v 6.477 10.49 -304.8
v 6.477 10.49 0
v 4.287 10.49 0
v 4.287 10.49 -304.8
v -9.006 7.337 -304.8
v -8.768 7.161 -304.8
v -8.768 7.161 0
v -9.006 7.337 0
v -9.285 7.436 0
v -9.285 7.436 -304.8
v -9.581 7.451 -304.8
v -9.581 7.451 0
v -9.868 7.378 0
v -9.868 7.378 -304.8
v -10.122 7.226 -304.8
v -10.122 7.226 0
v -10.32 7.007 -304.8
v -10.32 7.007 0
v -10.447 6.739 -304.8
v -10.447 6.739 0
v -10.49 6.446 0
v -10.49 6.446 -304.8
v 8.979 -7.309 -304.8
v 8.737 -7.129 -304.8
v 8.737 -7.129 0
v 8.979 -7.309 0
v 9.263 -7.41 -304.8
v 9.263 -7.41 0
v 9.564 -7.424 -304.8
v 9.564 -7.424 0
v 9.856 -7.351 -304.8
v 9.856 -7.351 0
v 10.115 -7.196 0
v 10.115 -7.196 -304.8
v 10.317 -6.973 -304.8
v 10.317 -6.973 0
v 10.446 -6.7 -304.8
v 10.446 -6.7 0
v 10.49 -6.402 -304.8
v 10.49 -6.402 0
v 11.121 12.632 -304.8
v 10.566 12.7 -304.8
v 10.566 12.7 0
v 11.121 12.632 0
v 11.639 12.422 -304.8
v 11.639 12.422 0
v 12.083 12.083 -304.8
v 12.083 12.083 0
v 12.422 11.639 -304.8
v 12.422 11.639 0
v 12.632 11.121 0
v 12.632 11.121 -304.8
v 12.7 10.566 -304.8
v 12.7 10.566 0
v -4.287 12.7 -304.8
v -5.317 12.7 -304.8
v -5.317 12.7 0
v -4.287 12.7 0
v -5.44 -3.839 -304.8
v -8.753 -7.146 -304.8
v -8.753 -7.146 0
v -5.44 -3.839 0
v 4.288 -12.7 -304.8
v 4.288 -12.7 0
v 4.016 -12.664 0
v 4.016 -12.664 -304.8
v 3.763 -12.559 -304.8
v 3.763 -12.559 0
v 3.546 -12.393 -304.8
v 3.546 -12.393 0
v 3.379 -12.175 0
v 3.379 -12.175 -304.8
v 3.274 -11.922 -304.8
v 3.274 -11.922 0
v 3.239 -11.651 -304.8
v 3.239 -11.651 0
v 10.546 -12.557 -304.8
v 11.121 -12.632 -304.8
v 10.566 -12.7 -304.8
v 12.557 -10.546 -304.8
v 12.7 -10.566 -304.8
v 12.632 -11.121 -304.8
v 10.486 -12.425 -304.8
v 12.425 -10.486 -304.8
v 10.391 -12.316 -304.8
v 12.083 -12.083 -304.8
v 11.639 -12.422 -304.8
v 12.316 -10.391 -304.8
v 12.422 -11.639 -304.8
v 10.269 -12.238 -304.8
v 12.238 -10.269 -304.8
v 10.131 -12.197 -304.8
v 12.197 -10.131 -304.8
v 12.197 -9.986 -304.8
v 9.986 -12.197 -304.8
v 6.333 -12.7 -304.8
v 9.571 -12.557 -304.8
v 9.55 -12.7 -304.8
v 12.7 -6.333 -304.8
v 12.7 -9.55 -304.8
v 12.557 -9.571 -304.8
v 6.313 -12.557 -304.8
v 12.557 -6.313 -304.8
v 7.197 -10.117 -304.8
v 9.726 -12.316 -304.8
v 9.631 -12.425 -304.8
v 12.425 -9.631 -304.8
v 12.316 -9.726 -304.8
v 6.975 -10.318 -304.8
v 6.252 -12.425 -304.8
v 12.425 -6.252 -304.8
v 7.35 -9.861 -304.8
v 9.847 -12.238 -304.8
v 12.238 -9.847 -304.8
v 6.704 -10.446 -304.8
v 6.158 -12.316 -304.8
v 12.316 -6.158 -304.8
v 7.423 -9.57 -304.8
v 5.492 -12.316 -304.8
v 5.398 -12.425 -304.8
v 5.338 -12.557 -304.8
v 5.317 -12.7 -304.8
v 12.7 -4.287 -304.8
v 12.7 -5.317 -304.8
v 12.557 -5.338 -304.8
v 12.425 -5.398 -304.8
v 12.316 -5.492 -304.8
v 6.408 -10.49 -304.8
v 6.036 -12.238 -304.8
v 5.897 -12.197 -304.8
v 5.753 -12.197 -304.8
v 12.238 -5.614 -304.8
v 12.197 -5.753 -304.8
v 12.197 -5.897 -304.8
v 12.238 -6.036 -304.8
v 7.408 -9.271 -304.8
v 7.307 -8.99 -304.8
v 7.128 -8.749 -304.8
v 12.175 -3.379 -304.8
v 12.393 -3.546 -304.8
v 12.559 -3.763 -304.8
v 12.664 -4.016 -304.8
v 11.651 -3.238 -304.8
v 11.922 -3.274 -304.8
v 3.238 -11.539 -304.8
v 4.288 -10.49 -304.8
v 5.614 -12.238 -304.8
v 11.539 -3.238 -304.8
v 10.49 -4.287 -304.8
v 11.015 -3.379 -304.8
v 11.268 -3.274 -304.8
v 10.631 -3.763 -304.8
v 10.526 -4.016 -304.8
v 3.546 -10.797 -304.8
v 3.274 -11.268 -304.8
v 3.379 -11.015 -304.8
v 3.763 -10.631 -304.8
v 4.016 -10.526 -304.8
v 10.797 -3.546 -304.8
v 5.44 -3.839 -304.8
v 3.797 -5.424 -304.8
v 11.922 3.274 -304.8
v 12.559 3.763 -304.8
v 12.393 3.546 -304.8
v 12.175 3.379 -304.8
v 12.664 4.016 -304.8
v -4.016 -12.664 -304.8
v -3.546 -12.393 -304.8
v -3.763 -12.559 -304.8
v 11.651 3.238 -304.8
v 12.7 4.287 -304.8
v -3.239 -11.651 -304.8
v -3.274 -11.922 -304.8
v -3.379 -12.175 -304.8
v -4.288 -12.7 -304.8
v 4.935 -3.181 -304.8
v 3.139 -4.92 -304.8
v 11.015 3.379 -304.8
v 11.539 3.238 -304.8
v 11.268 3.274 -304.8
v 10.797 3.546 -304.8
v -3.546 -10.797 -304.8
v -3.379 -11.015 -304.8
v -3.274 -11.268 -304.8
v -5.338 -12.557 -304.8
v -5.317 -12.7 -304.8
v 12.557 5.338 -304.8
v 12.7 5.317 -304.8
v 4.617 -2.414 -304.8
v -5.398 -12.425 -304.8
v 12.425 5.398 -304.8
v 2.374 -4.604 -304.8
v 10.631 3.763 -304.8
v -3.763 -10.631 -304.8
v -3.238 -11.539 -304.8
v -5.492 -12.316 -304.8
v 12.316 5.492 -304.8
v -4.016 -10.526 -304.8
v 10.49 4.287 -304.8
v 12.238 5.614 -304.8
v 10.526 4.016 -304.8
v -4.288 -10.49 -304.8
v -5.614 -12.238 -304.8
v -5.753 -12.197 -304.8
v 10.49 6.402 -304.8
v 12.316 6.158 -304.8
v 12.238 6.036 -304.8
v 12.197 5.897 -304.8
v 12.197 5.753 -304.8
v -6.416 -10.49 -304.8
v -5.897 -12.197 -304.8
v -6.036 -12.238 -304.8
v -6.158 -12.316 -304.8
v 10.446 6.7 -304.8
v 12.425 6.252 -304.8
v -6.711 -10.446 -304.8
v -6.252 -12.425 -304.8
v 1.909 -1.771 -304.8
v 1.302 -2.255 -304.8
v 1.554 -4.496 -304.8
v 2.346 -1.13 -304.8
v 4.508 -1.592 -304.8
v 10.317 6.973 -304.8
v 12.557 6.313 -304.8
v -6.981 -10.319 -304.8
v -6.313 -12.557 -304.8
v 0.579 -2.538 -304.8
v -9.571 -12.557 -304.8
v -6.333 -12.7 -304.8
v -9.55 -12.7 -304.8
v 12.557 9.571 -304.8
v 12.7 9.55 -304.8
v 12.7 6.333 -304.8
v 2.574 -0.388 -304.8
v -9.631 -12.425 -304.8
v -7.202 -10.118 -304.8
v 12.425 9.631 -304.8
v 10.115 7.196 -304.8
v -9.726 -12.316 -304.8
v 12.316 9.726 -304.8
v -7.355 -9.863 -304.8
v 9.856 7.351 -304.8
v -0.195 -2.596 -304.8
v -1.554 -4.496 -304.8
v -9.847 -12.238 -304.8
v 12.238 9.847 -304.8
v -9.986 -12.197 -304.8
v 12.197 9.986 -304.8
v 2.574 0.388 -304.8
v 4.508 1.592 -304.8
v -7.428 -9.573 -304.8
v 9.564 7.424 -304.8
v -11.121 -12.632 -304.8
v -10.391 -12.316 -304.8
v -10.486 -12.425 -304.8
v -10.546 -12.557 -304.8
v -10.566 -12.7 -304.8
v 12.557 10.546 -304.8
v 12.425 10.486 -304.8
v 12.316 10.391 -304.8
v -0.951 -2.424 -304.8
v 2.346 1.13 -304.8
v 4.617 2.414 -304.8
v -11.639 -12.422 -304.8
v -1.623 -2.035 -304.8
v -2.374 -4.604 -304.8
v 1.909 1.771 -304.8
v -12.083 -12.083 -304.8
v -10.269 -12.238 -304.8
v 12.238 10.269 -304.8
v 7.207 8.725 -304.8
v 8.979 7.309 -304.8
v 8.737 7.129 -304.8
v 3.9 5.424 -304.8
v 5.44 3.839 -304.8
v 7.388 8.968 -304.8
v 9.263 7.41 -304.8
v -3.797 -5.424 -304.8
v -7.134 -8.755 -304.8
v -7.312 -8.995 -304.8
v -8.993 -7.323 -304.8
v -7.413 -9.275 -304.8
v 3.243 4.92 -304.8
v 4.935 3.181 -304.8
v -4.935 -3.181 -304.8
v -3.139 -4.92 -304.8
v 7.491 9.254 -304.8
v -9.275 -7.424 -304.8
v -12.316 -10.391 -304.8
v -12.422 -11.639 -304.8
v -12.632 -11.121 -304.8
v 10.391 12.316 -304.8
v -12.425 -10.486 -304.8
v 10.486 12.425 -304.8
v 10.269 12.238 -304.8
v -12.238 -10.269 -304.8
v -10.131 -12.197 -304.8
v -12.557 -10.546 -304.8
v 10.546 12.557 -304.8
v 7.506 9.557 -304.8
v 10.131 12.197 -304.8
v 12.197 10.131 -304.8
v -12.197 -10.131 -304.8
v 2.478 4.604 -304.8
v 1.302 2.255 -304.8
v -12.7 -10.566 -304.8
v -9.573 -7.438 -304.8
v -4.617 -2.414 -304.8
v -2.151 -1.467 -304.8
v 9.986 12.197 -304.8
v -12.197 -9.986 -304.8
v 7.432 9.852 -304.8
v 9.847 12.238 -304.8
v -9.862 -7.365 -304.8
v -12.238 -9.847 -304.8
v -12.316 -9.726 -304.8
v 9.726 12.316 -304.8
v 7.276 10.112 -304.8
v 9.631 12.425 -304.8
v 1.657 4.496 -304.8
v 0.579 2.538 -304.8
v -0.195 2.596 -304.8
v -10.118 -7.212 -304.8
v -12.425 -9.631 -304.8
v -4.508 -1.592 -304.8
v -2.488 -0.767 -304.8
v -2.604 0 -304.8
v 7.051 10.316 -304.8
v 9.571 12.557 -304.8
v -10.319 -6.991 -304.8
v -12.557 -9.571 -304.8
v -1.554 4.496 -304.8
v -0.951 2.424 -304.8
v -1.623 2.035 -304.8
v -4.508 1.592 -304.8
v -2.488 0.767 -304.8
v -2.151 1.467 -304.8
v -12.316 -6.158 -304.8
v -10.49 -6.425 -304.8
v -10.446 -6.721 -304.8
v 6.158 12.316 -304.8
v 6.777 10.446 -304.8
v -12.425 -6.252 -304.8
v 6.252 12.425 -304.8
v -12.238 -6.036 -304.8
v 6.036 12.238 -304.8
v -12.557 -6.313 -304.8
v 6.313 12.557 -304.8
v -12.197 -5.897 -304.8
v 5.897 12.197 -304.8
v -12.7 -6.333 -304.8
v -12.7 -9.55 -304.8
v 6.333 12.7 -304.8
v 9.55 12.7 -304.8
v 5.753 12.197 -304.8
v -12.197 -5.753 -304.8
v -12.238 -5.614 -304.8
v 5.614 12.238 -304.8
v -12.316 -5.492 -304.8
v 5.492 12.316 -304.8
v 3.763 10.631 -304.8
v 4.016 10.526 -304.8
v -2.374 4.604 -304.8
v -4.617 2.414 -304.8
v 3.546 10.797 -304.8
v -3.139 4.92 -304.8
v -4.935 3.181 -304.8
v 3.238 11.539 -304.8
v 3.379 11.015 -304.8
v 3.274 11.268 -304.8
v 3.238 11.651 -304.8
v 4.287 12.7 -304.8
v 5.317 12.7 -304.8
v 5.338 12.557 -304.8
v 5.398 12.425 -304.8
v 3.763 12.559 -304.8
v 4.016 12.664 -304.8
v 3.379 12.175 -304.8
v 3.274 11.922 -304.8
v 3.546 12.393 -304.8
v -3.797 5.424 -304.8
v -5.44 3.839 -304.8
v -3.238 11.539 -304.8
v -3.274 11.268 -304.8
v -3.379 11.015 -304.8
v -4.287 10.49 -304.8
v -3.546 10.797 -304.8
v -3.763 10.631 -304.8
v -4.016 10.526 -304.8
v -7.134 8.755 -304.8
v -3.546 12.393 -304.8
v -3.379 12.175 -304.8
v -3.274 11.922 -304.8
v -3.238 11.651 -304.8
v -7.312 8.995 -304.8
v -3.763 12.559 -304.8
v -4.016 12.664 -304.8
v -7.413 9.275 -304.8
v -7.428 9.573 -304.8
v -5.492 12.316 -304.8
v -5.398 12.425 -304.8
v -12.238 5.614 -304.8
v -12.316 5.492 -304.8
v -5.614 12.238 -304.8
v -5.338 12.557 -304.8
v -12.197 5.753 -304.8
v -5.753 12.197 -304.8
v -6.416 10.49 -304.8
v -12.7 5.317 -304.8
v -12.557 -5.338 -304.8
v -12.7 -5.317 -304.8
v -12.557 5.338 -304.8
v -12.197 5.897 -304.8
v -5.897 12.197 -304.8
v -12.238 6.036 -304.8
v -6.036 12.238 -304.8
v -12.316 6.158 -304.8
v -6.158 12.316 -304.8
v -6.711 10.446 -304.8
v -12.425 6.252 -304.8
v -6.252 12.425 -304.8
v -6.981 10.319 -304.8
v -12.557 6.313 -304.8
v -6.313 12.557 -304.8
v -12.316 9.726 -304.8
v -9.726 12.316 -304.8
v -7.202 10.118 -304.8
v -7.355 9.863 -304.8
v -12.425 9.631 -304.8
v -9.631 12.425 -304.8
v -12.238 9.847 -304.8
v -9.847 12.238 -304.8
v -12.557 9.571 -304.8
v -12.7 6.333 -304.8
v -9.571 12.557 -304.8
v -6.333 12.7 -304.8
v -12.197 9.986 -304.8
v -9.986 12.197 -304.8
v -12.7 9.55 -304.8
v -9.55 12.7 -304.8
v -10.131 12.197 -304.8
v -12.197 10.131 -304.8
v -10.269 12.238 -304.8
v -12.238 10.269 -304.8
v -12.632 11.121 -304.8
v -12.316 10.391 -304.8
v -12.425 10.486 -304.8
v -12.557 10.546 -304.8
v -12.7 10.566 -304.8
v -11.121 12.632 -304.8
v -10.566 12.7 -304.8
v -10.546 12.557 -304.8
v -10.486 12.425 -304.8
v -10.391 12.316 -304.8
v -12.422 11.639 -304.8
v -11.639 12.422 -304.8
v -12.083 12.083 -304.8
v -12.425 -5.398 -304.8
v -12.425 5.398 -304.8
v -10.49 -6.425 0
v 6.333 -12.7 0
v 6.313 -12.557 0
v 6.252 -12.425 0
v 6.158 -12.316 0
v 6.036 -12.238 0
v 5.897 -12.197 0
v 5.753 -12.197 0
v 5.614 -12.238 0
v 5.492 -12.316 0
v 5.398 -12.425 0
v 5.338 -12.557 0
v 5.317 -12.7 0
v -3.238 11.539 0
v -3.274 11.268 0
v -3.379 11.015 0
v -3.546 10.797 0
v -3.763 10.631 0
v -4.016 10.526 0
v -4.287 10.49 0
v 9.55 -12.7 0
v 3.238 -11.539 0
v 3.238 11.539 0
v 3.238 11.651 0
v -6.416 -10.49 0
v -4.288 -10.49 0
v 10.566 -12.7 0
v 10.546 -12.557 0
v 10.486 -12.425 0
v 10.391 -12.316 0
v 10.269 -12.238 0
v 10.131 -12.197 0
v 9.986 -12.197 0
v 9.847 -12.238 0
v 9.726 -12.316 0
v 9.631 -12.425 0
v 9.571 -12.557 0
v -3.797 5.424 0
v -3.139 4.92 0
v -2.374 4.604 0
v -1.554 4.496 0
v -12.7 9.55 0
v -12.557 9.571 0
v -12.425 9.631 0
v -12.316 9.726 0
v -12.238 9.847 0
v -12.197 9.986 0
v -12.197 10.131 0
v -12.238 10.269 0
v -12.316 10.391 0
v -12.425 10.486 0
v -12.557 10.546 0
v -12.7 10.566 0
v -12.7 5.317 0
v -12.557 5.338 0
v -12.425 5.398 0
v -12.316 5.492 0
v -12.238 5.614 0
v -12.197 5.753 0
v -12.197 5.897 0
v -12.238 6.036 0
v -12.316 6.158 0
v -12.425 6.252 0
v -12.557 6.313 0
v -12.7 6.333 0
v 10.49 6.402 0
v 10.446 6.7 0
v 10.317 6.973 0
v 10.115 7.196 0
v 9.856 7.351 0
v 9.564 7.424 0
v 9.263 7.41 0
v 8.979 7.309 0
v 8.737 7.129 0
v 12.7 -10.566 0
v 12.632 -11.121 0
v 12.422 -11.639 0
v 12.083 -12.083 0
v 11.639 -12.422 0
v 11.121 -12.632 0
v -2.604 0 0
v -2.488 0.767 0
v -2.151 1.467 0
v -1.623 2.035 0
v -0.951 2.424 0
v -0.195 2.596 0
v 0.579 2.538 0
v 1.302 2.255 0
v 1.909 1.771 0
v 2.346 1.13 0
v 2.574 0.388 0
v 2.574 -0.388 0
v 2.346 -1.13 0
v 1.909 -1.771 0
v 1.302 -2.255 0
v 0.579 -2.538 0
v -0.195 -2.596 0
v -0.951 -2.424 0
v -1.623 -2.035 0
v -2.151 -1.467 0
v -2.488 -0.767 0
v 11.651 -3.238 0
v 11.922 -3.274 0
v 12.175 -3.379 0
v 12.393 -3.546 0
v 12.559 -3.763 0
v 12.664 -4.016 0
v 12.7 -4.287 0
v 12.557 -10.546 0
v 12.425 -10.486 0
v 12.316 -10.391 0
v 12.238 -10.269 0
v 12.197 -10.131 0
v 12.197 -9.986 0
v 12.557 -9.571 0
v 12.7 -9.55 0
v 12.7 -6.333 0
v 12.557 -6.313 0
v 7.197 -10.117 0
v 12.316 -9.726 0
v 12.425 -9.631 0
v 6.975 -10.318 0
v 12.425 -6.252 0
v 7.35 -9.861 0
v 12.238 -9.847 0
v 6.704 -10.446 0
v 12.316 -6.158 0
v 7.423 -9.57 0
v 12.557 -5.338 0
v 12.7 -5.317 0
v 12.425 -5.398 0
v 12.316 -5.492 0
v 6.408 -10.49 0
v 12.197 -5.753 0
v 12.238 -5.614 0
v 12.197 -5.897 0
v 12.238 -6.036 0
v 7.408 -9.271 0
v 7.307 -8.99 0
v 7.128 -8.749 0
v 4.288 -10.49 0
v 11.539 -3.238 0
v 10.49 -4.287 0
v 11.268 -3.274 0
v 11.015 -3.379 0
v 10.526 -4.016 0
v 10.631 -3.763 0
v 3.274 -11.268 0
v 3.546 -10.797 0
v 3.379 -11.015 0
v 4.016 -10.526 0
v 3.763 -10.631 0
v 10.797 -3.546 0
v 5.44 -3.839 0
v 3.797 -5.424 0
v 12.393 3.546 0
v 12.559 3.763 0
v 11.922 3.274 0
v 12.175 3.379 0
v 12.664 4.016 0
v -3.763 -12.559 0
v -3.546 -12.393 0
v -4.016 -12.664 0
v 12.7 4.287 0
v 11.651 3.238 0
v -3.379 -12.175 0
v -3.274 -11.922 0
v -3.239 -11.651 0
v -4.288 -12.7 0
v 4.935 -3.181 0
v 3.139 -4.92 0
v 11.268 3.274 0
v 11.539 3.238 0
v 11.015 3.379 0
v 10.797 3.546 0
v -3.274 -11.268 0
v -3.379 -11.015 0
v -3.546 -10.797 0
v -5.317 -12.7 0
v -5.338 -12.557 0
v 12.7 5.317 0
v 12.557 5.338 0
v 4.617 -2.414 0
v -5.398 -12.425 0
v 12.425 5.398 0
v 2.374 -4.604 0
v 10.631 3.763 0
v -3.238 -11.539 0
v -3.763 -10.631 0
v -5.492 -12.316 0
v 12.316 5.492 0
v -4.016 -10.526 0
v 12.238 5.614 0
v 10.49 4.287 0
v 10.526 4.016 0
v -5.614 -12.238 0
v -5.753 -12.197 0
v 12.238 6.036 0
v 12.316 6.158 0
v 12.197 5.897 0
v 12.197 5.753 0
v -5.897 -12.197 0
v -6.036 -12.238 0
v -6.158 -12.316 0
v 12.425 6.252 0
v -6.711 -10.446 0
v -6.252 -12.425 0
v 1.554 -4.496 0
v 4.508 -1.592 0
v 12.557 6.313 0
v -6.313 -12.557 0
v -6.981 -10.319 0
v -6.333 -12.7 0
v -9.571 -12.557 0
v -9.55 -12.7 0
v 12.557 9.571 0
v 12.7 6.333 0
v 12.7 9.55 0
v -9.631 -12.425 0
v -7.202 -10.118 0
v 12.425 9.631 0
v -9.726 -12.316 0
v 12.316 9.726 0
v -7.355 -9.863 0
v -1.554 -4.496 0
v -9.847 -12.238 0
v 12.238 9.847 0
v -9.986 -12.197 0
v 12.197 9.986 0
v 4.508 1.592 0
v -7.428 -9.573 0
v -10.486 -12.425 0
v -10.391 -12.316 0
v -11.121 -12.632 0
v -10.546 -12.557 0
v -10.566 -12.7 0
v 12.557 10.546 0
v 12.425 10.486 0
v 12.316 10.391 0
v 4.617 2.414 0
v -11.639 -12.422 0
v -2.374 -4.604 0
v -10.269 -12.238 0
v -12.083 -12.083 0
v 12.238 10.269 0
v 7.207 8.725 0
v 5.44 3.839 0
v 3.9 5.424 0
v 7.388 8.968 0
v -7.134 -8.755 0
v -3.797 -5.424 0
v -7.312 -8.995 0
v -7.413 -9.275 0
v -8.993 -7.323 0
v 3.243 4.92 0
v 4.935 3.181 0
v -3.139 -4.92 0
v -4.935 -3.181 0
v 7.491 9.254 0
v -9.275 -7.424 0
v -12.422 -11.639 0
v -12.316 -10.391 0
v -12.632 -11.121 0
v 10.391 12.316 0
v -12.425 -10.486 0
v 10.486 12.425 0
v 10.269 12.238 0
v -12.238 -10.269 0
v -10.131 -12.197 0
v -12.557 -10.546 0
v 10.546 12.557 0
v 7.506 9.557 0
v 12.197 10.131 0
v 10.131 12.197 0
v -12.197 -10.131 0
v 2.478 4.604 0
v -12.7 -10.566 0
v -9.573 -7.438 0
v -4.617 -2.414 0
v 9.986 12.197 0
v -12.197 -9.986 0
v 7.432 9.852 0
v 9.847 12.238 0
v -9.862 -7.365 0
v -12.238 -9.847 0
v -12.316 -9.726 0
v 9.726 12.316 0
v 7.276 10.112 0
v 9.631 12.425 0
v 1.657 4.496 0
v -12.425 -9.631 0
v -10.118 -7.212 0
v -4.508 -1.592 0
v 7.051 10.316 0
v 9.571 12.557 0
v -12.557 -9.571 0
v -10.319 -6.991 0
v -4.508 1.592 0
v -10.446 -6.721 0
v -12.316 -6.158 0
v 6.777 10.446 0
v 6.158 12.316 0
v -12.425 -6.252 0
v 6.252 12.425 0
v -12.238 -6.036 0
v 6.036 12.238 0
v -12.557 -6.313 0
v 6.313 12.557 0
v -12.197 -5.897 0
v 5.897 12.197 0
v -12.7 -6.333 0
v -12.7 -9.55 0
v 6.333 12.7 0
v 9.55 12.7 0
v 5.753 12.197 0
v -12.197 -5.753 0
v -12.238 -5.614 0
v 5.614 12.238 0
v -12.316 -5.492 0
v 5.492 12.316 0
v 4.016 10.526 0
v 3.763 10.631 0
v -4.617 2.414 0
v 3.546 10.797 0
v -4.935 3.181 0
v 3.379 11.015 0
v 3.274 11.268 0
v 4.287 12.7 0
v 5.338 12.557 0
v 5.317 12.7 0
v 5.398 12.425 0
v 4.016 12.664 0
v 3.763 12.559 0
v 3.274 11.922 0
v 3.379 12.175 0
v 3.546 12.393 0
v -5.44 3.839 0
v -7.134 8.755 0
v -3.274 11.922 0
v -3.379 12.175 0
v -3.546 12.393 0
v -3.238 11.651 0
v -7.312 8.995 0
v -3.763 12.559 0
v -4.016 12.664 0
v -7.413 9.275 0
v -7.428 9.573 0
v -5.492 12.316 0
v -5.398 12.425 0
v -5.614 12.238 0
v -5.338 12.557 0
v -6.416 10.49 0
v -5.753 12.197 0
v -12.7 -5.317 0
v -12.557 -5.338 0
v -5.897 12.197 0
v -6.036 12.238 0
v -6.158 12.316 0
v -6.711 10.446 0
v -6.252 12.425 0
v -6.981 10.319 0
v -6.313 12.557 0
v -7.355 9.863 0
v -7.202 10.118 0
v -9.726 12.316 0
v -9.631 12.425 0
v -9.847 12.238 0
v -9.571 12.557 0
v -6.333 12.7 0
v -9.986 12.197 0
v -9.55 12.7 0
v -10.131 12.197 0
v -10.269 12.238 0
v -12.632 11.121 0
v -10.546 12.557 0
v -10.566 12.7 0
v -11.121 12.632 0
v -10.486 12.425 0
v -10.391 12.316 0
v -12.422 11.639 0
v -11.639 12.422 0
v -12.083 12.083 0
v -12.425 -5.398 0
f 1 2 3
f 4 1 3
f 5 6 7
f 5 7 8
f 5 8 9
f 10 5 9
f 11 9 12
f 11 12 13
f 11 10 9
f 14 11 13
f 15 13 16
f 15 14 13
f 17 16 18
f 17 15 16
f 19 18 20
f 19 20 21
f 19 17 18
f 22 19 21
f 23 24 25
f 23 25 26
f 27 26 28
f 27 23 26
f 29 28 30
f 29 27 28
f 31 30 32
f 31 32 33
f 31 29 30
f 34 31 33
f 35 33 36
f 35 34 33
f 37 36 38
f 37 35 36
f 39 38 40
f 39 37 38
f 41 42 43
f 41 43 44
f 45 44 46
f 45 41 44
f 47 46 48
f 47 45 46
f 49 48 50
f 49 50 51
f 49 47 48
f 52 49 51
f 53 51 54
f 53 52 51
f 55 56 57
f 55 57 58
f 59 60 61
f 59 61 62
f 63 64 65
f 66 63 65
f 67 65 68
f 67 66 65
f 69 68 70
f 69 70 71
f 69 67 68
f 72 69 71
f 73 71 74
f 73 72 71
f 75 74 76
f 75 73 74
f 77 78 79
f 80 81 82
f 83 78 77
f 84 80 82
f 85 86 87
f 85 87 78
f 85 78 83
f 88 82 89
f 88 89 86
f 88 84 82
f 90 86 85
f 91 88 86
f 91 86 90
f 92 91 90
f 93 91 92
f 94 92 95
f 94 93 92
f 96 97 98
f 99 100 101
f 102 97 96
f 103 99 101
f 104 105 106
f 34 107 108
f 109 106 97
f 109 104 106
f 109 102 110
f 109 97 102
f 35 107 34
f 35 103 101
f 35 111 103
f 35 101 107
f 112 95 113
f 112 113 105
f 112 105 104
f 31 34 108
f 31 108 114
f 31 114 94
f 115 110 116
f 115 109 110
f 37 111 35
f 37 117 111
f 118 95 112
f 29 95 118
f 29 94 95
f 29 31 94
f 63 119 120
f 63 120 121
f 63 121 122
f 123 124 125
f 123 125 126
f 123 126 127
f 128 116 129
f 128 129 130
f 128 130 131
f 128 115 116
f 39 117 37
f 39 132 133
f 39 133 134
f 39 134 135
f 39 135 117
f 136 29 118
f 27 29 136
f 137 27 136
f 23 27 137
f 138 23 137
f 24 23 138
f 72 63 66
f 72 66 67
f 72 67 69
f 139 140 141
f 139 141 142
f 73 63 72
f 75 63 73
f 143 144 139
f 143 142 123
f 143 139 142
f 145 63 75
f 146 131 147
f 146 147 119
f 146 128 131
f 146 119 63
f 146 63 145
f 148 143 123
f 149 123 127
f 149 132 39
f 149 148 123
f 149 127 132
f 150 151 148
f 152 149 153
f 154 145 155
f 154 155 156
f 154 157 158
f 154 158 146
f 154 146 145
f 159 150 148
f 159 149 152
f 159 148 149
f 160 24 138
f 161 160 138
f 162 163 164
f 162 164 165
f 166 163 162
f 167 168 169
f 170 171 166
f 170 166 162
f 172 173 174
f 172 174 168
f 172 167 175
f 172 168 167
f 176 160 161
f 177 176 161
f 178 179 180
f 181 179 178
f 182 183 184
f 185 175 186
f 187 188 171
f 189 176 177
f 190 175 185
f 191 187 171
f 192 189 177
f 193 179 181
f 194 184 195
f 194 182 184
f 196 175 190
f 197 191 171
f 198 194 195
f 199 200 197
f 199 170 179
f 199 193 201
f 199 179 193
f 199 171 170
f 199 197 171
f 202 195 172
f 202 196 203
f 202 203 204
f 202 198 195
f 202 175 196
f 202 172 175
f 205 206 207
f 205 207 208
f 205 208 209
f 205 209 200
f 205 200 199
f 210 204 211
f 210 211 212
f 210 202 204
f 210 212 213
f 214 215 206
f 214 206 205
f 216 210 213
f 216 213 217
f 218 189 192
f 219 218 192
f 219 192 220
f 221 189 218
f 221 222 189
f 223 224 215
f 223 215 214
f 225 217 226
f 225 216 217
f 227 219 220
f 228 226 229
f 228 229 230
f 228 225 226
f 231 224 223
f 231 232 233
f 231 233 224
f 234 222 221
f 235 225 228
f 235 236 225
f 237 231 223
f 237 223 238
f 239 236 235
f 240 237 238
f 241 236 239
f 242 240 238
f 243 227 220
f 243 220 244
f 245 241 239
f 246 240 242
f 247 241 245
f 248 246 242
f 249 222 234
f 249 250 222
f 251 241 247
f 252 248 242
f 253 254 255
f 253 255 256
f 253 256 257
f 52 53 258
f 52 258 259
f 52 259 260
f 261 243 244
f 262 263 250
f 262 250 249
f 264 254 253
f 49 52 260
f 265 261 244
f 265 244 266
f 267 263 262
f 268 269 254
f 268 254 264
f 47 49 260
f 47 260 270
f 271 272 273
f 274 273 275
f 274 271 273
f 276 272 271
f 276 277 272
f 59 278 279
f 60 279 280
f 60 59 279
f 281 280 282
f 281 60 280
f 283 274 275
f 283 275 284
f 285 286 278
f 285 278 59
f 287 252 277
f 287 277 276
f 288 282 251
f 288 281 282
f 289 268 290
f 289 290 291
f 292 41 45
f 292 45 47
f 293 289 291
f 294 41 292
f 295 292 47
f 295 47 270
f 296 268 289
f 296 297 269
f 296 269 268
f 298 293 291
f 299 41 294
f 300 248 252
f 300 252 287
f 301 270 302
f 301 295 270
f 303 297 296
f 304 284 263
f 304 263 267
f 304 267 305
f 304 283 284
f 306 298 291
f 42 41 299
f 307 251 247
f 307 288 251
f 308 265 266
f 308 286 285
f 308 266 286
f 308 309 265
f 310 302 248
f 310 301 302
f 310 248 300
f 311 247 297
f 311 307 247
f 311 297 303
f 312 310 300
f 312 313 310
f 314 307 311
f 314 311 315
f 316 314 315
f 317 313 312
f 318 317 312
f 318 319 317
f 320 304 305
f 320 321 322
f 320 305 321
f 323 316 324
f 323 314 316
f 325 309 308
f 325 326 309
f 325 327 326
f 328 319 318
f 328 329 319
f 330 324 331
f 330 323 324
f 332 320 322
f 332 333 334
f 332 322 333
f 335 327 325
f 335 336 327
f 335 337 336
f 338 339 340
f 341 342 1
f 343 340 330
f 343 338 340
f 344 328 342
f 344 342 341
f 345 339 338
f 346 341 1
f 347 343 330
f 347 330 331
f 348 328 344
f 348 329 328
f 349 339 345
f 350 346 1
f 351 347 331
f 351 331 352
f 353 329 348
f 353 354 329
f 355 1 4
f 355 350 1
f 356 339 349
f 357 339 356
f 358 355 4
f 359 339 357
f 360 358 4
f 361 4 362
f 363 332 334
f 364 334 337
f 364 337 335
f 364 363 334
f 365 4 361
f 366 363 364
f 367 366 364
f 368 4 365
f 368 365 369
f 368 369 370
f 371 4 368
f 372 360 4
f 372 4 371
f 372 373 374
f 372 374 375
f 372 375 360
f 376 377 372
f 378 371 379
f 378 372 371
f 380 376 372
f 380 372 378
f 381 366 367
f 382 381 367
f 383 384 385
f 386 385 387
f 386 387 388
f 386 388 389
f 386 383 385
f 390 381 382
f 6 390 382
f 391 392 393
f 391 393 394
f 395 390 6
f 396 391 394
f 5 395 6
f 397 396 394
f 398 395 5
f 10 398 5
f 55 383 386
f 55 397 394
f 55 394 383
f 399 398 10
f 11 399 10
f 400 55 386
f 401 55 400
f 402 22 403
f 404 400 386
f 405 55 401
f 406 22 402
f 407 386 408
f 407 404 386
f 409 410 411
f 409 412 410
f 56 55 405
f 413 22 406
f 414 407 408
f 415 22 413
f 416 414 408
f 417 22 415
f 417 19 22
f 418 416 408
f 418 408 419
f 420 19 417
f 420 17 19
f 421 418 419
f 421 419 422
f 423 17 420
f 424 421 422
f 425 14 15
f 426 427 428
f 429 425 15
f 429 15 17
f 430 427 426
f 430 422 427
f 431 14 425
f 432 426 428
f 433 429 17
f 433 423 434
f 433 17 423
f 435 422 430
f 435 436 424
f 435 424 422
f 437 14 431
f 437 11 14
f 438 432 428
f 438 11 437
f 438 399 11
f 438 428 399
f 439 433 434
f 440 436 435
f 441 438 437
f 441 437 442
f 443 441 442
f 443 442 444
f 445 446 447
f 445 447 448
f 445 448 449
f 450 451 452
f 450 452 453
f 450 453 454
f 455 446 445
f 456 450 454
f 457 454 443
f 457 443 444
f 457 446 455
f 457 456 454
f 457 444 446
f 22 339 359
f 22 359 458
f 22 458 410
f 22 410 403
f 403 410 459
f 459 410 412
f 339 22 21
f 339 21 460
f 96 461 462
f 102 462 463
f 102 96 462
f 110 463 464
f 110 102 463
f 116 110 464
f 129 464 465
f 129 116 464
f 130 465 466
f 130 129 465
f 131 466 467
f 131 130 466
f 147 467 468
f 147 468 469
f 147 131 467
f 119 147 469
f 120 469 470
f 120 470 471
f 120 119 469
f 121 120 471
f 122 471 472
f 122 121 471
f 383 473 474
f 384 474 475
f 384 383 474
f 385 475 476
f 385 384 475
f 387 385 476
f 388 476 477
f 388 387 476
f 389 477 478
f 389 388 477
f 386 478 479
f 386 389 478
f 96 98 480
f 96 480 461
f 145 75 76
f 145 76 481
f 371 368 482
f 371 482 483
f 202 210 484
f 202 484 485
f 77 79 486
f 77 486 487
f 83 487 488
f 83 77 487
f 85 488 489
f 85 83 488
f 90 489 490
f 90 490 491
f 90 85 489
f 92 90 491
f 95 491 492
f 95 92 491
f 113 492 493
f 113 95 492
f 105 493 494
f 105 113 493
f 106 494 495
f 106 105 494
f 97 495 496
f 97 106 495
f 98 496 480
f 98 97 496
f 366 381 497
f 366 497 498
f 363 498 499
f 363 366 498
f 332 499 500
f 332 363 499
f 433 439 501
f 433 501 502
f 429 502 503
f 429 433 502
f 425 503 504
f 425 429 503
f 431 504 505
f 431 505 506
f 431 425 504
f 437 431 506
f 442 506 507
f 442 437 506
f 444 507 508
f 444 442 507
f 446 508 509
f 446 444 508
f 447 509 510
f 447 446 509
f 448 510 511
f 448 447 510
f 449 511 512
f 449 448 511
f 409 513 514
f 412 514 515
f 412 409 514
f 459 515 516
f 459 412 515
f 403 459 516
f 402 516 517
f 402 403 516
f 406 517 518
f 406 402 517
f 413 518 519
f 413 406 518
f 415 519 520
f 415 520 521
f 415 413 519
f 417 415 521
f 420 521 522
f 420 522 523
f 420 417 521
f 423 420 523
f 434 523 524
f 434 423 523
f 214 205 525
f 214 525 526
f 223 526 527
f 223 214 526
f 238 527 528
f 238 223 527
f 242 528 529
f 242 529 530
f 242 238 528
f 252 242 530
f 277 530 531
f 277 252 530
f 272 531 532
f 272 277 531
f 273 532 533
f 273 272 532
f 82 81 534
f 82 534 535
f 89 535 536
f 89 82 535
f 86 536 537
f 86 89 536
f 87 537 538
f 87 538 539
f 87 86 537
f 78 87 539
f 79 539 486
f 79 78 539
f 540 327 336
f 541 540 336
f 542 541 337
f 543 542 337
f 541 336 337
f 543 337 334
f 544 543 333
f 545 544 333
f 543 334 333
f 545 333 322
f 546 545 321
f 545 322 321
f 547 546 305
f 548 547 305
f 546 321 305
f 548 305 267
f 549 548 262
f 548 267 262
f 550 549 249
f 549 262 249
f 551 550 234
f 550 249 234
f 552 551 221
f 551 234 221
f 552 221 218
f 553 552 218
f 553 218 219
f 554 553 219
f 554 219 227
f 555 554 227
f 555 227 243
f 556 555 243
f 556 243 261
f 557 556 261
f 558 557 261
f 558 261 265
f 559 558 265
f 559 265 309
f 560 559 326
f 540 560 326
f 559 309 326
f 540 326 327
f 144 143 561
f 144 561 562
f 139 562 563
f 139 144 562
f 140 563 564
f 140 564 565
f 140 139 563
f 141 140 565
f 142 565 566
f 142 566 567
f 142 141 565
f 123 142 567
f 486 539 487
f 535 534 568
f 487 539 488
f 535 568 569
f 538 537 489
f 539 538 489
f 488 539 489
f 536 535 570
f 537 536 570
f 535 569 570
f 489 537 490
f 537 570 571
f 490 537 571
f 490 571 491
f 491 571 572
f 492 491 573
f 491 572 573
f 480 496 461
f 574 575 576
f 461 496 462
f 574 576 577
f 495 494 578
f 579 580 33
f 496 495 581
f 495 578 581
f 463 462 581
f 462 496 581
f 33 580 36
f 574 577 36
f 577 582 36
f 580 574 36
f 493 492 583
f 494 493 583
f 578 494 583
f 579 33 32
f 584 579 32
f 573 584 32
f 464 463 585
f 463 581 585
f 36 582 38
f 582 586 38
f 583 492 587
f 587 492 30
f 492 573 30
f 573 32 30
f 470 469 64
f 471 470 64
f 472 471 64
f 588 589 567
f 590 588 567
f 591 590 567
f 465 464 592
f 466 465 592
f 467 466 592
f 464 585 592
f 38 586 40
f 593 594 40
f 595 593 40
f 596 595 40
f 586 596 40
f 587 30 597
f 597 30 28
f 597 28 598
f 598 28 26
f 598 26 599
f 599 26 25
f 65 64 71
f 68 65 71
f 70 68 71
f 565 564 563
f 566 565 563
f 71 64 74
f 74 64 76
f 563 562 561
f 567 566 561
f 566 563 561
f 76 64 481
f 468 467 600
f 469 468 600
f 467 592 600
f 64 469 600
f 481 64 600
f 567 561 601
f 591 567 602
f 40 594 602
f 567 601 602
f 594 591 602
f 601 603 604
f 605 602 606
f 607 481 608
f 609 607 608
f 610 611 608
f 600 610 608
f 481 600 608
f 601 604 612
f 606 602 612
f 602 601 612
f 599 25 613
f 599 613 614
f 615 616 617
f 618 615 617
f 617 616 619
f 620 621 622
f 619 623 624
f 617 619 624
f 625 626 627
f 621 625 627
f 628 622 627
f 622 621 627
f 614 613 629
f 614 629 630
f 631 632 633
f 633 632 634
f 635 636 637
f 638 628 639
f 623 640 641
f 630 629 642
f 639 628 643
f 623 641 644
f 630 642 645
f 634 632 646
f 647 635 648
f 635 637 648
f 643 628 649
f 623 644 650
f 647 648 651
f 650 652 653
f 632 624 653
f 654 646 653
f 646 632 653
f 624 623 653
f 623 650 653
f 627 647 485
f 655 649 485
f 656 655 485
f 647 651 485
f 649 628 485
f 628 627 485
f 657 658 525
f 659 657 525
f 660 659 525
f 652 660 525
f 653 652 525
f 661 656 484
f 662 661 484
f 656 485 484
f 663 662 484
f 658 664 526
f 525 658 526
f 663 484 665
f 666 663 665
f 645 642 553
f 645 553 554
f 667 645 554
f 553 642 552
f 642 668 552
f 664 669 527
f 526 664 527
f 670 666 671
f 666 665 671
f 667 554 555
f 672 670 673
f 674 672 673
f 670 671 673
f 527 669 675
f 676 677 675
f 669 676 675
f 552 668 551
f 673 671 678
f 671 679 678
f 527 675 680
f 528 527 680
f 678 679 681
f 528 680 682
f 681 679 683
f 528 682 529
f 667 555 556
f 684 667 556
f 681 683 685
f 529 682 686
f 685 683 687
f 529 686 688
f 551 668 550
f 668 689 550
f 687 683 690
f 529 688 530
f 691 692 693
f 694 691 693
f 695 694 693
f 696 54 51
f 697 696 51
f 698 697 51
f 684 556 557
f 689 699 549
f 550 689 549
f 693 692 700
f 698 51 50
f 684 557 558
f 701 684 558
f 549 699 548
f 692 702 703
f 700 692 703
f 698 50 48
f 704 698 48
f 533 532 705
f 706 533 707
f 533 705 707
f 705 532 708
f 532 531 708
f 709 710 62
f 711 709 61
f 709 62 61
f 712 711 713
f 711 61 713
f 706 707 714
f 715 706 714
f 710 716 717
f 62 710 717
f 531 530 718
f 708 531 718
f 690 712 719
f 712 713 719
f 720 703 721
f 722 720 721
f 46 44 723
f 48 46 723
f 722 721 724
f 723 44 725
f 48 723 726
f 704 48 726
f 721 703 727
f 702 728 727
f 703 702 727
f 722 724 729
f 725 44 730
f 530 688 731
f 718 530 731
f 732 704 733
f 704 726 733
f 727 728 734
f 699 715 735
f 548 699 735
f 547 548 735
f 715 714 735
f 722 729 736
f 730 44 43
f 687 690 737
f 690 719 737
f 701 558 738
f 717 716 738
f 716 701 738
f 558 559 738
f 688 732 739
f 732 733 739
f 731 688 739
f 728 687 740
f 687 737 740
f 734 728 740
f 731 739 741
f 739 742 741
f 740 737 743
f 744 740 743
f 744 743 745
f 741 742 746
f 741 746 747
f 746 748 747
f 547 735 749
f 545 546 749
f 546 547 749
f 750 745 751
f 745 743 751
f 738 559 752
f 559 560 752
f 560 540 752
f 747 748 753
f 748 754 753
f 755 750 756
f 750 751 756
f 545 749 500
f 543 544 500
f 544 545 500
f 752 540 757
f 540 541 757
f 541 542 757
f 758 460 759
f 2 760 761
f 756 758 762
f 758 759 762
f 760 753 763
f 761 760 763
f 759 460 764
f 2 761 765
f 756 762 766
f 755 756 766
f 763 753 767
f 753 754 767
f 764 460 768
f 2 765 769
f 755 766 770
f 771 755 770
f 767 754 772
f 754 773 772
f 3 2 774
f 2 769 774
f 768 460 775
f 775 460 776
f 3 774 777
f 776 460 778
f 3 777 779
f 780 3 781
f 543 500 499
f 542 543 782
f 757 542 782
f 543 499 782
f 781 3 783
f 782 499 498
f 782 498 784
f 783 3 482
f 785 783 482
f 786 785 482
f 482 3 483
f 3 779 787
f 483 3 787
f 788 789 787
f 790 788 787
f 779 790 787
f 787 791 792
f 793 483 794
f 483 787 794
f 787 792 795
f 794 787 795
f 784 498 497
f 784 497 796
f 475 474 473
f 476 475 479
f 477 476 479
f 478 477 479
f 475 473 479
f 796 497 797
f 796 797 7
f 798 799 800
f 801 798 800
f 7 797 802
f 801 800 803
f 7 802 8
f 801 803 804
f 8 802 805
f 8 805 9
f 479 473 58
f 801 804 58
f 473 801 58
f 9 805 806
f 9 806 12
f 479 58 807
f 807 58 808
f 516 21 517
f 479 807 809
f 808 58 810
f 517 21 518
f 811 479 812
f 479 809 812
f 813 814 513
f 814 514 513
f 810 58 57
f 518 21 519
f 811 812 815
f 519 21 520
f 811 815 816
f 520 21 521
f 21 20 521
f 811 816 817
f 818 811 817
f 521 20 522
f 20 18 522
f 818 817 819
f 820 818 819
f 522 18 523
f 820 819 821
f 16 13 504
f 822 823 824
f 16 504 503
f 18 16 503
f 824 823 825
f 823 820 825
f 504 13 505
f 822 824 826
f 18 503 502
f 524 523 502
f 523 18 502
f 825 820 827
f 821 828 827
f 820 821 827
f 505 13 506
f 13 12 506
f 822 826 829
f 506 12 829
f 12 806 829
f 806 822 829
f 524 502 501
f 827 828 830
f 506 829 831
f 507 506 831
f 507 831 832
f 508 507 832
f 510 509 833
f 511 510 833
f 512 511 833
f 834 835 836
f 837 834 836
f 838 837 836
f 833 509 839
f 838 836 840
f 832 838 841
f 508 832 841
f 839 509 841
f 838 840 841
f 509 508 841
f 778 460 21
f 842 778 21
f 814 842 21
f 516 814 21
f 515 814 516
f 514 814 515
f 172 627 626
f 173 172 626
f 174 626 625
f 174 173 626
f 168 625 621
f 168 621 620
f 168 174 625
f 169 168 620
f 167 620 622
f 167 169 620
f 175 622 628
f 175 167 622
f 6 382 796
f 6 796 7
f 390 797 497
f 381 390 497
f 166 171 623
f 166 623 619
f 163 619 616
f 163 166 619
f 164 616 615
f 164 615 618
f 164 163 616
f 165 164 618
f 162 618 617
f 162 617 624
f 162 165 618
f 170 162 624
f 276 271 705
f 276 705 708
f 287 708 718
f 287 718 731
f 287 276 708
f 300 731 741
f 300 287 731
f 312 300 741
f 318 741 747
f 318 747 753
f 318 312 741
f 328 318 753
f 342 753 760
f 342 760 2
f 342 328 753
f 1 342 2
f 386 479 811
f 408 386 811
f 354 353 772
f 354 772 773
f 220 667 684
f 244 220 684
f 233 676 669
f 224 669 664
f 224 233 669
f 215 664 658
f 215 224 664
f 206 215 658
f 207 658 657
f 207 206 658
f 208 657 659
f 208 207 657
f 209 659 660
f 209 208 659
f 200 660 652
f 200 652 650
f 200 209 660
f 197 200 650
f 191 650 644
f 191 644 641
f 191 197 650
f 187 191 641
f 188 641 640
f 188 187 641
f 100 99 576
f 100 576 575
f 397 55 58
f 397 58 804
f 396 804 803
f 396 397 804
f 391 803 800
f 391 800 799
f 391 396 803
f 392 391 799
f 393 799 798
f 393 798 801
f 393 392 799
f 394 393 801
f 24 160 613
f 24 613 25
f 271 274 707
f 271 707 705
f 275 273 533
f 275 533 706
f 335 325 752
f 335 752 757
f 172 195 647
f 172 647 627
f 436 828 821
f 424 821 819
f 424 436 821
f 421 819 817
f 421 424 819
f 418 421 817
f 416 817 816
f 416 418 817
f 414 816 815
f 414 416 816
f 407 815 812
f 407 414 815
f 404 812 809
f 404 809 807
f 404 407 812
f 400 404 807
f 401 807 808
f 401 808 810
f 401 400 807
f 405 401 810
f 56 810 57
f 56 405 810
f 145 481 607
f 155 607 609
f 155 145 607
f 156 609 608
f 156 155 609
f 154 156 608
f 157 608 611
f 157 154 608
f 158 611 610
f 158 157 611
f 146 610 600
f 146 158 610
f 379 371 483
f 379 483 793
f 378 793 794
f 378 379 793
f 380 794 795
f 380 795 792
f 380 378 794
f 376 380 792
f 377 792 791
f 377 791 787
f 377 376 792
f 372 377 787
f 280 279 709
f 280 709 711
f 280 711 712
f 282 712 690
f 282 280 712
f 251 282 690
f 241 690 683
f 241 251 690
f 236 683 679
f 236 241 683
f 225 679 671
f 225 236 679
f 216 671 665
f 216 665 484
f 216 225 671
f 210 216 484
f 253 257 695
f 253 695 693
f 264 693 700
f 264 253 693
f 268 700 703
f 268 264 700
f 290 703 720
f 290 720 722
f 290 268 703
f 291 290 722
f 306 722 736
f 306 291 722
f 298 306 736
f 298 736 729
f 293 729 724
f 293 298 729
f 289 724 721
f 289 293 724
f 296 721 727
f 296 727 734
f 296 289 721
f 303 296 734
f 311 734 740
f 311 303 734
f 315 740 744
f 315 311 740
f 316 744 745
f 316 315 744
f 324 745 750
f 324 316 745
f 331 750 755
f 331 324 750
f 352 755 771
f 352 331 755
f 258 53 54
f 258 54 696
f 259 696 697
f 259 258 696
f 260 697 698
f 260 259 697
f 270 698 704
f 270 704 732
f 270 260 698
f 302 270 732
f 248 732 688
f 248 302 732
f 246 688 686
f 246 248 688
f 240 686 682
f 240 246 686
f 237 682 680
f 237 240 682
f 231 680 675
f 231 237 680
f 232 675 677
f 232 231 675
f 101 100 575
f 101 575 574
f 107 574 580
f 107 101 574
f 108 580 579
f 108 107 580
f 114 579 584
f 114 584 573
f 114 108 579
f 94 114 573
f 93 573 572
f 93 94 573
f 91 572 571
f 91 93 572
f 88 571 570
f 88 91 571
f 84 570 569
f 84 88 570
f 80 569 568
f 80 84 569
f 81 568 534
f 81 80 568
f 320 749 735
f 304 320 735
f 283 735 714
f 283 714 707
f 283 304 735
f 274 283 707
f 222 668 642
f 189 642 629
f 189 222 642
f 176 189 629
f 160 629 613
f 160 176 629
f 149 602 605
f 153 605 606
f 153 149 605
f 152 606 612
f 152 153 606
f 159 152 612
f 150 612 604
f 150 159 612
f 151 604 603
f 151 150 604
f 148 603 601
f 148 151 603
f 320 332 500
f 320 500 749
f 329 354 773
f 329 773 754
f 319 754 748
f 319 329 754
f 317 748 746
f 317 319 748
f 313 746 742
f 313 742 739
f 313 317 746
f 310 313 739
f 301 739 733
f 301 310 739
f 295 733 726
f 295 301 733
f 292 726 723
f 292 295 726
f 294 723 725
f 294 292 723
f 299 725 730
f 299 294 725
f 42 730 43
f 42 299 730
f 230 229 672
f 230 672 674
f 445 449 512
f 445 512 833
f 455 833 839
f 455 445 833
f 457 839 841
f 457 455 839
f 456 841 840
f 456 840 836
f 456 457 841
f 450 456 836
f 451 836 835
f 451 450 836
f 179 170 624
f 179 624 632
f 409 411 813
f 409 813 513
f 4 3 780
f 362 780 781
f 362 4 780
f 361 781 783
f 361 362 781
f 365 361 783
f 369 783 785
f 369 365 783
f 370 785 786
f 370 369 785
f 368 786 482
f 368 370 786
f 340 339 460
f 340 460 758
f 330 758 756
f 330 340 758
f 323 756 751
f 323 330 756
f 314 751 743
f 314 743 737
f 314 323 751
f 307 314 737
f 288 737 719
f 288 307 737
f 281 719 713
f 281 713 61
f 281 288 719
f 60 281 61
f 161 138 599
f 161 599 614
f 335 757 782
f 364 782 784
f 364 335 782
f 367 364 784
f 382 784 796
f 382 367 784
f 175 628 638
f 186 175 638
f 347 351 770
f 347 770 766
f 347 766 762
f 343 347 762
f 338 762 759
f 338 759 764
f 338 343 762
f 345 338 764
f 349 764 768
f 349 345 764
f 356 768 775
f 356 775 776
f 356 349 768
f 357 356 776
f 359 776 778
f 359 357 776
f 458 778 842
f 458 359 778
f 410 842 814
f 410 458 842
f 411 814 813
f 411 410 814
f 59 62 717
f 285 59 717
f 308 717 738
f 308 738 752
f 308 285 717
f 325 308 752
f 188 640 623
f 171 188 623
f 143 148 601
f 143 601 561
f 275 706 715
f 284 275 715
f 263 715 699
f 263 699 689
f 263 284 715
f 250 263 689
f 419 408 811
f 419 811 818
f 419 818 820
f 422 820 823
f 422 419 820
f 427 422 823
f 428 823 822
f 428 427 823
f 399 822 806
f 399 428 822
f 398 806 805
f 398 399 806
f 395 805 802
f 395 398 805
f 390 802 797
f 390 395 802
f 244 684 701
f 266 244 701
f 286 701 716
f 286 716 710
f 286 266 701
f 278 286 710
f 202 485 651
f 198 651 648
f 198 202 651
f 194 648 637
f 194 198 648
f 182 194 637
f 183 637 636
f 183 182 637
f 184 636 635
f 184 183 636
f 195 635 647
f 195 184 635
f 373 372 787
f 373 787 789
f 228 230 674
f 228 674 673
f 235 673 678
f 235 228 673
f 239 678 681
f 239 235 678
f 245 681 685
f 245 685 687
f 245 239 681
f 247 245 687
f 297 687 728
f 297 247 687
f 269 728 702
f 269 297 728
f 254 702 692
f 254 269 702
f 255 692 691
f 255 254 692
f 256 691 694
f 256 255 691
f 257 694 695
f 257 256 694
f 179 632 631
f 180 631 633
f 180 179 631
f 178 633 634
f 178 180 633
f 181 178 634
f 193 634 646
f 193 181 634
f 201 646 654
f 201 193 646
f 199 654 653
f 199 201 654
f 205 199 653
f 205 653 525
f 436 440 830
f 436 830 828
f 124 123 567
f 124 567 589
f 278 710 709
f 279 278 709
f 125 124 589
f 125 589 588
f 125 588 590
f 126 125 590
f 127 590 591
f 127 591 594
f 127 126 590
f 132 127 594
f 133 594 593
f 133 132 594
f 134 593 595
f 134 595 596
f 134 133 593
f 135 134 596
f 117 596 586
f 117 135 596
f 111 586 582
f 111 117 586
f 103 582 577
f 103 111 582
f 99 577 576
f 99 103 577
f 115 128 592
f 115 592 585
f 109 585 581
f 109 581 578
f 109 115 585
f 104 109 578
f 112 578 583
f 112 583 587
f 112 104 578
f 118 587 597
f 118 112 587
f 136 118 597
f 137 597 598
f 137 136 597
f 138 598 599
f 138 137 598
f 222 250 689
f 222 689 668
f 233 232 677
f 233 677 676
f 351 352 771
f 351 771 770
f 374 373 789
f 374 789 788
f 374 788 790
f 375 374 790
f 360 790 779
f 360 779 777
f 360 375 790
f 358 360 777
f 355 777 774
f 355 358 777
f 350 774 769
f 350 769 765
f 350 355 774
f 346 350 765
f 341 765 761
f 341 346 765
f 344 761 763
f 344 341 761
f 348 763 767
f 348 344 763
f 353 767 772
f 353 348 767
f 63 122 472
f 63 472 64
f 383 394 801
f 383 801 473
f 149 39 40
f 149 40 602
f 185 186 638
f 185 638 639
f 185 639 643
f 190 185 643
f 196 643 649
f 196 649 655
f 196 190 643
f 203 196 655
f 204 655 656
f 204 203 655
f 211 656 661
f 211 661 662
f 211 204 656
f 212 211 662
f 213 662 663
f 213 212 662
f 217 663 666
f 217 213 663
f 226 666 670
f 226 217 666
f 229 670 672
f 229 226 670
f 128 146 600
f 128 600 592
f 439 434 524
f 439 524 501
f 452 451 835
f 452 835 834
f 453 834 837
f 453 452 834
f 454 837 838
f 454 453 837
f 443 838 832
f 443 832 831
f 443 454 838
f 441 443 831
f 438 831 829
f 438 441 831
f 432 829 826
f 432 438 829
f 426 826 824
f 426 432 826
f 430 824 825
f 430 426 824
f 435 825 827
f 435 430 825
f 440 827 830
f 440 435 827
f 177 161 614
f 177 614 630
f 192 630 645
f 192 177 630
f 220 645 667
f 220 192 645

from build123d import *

# Parameters (mm, degrees)
SKETCH1_R           = 2.6035
BOSS_EXTRUDE1_DEPTH = 304.8


with BuildPart() as part:
    # Sketch1 → Boss-Extrude1 (new body)
    with BuildSketch(Plane(origin=(0, 0, -304.8), x_dir=(-1, 0, 0), z_dir=(0, 0, -1))):
        with BuildLine():
            Line((6.416409763, -10.4902), (4.28752, -10.4902))
            ThreePointArc((4.28752, -10.4902), (3.545750844, -10.797450844), (3.2385, -11.53922))
            Line((3.2385, -11.53922), (3.2385, -11.65098))
            ThreePointArc((3.2385, -11.65098), (3.545750844, -12.392749156), (4.28752, -12.7))
            Line((4.28752, -12.7), (5.3170836, -12.7))
            ThreePointArc((5.3170836, -12.7), (5.8250836, -12.192), (6.3330836, -12.7))
            Line((6.3330836, -12.7), (9.5504, -12.7))
            ThreePointArc((9.5504, -12.7), (10.058323491, -12.192000006), (10.566399977, -12.699846982))
            ThreePointArc((10.566399977, -12.699846982), (12.082522516, -12.082522516), (12.699846982, -10.566399977))
            ThreePointArc((12.699846982, -10.566399977), (12.192000006, -10.058323491), (12.7, -9.5504))
            Line((12.7, -9.5504), (12.7, -6.3330836))
            ThreePointArc((12.7, -6.3330836), (12.192, -5.8250836), (12.7, -5.3170836))
            Line((12.7, -5.3170836), (12.7, 5.3171344))
            ThreePointArc((12.7, 5.3171344), (12.192, 5.8251344), (12.7, 6.3331344))
            Line((12.7, 6.3331344), (12.7, 9.5504))
            ThreePointArc((12.7, 9.5504), (12.192000006, 10.058323491), (12.699846982, 10.566399977))
            ThreePointArc((12.699846982, 10.566399977), (12.082522516, 12.082522516), (10.566399977, 12.699846982))
            ThreePointArc((10.566399977, 12.699846982), (10.058323491, 12.192000006), (9.5504, 12.7))
            Line((9.5504, 12.7), (6.3331344, 12.7))
            ThreePointArc((6.3331344, 12.7), (5.8251344, 12.192), (5.3171344, 12.7))
            Line((5.3171344, 12.7), (4.2874692, 12.7))
            ThreePointArc((4.2874692, 12.7), (3.545700044, 12.392749156), (3.2384492, 11.65098))
            Line((3.2384492, 11.65098), (3.2384492, 11.53922))
            ThreePointArc((3.2384492, 11.53922), (3.545700044, 10.797450844), (4.2874692, 10.4902))
            Line((4.2874692, 10.4902), (6.416384363, 10.4902))
            ThreePointArc((6.416384363, 10.4902), (7.355223148, 9.862578342), (7.134149423, 8.755124678))
            Line((7.134149423, 8.755124678), (3.796632915, 5.423689619))
            ThreePointArc((3.796632915, 5.423689619), (2.767299421, 4.736928798), (1.553617102, 4.4958))
            Line((1.553617102, 4.4958), (-1.657299581, 4.4958))
            ThreePointArc((-1.657299581, 4.4958), (-2.8709819, 4.736928798), (-3.900315394, 5.423689619))
            Line((-3.900315394, 5.423689619), (-7.207191475, 8.724540082))
            ThreePointArc((-7.207191475, 8.724540082), (-7.43216212, 9.851515102), (-6.476774195, 10.4902))
            Line((-6.476774195, 10.4902), (-4.2874692, 10.4902))
            ThreePointArc((-4.2874692, 10.4902), (-3.545700044, 10.797450844), (-3.2384492, 11.53922))
            Line((-3.2384492, 11.53922), (-3.2384492, 11.65098))
            ThreePointArc((-3.2384492, 11.65098), (-3.545700044, 12.392749156), (-4.2874692, 12.7))
            Line((-4.2874692, 12.7), (-5.3170836, 12.7))
            ThreePointArc((-5.3170836, 12.7), (-5.8250836, 12.192), (-6.3330836, 12.7))
            Line((-6.3330836, 12.7), (-9.5504, 12.7))
            ThreePointArc((-9.5504, 12.7), (-10.058323491, 12.192000006), (-10.566399977, 12.699846982))
            ThreePointArc((-10.566399977, 12.699846982), (-12.082522516, 12.082522516), (-12.699846982, 10.566399977))
            ThreePointArc((-12.699846982, 10.566399977), (-12.192000006, 10.058323491), (-12.7, 9.5504))
            Line((-12.7, 9.5504), (-12.7, 6.3331344))
            ThreePointArc((-12.7, 6.3331344), (-12.192, 5.8251344), (-12.7, 5.3171344))
            Line((-12.7, 5.3171344), (-12.7, 4.287470133))
            ThreePointArc((-12.7, 4.287470133), (-12.392749156, 3.545700977), (-11.65098, 3.238450133))
            Line((-11.65098, 3.238450133), (-11.53922, 3.238450133))
            ThreePointArc((-11.53922, 3.238450133), (-10.797450844, 3.545700977), (-10.4902, 4.287470133))
            Line((-10.4902, 4.287470133), (-10.4902, 6.402089023))
            ThreePointArc((-10.4902, 6.402089023), (-9.856394933, 7.351113629), (-8.736962546, 7.129240479))
            Line((-8.736962546, 7.129240479), (-5.440484187, 3.838768792))
            ThreePointArc((-5.440484187, 3.838768792), (-4.75073678, 2.808015636), (-4.5085, 1.591658411))
            Line((-4.5085, 1.591658411), (-4.5085, -1.591658411))
            ThreePointArc((-4.5085, -1.591658411), (-4.75073678, -2.808015636), (-5.440484187, -3.838768792))
            Line((-5.440484187, -3.838768792), (-8.736962546, -7.129240479))
            ThreePointArc((-8.736962546, -7.129240479), (-9.856394933, -7.351113629), (-10.4902, -6.402089023))
            Line((-10.4902, -6.402089023), (-10.4902, -4.287470133))
            ThreePointArc((-10.4902, -4.287470133), (-10.797450844, -3.545700977), (-11.53922, -3.238450133))
            Line((-11.53922, -3.238450133), (-11.65098, -3.238450133))
            ThreePointArc((-11.65098, -3.238450133), (-12.392749156, -3.545700977), (-12.7, -4.287470133))
            Line((-12.7, -4.287470133), (-12.7, -5.3170836))
            ThreePointArc((-12.7, -5.3170836), (-12.192, -5.8250836), (-12.7, -6.3330836))
            Line((-12.7, -6.3330836), (-12.7, -9.5504))
            ThreePointArc((-12.7, -9.5504), (-12.192000006, -10.058323491), (-12.699846982, -10.566399977))
            ThreePointArc((-12.699846982, -10.566399977), (-12.082522516, -12.082522516), (-10.566399977, -12.699846982))
            ThreePointArc((-10.566399977, -12.699846982), (-10.058323491, -12.192000006), (-9.5504, -12.7))
            Line((-9.5504, -12.7), (-6.3331344, -12.7))
            ThreePointArc((-6.3331344, -12.7), (-5.8251344, -12.192), (-5.3171344, -12.7))
            Line((-5.3171344, -12.7), (-4.28752, -12.7))
            ThreePointArc((-4.28752, -12.7), (-3.545750844, -12.392749156), (-3.2385, -11.65098))
            Line((-3.2385, -11.65098), (-3.2385, -11.53922))
            ThreePointArc((-3.2385, -11.53922), (-3.545750844, -10.797450844), (-4.28752, -10.4902))
            Line((-4.28752, -10.4902), (-6.40834956, -10.4902))
            ThreePointArc((-6.40834956, -10.4902), (-7.350269456, -9.860518594), (-7.128470204, -8.749430454))
            Line((-7.128470204, -8.749430454), (-3.796658315, -5.423689619))
            ThreePointArc((-3.796658315, -5.423689619), (-2.767324821, -4.736928798), (-1.553642502, -4.4958))
            Line((-1.553642502, -4.4958), (1.553642502, -4.4958))
            ThreePointArc((1.553642502, -4.4958), (2.767324821, -4.736928798), (3.796658315, -5.423689619))
            Line((3.796658315, -5.423689619), (7.134174823, -8.755124678))
            ThreePointArc((7.134174823, -8.755124678), (7.355248548, -9.862578342), (6.416409763, -10.4902))
        make_face()
        Circle(SKETCH1_R, mode=Mode.SUBTRACT)
        with BuildLine():
            Line((10.4902, 6.446436794), (10.4902, -6.425372487))
            ThreePointArc((10.4902, -6.425372487), (9.862352148, -7.36547709), (8.753441447, -7.145689354))
            Line((8.753441447, -7.145689354), (5.440484187, -3.838768792))
            ThreePointArc((5.440484187, -3.838768792), (4.75073678, -2.808015636), (4.5085, -1.591658411))
            Line((4.5085, -1.591658411), (4.5085, 1.591658411))
            ThreePointArc((4.5085, 1.591658411), (4.75073678, 2.808015636), (5.440484187, 3.838768792))
            Line((5.440484187, 3.838768792), (8.768349738, 7.160570479))
            ThreePointArc((8.768349738, 7.160570479), (9.867741577, 7.378471563), (10.4902, 6.446436794))
        make_face(mode=Mode.SUBTRACT)
    extrude(amount=-BOSS_EXTRUDE1_DEPTH)


solid = part.part
